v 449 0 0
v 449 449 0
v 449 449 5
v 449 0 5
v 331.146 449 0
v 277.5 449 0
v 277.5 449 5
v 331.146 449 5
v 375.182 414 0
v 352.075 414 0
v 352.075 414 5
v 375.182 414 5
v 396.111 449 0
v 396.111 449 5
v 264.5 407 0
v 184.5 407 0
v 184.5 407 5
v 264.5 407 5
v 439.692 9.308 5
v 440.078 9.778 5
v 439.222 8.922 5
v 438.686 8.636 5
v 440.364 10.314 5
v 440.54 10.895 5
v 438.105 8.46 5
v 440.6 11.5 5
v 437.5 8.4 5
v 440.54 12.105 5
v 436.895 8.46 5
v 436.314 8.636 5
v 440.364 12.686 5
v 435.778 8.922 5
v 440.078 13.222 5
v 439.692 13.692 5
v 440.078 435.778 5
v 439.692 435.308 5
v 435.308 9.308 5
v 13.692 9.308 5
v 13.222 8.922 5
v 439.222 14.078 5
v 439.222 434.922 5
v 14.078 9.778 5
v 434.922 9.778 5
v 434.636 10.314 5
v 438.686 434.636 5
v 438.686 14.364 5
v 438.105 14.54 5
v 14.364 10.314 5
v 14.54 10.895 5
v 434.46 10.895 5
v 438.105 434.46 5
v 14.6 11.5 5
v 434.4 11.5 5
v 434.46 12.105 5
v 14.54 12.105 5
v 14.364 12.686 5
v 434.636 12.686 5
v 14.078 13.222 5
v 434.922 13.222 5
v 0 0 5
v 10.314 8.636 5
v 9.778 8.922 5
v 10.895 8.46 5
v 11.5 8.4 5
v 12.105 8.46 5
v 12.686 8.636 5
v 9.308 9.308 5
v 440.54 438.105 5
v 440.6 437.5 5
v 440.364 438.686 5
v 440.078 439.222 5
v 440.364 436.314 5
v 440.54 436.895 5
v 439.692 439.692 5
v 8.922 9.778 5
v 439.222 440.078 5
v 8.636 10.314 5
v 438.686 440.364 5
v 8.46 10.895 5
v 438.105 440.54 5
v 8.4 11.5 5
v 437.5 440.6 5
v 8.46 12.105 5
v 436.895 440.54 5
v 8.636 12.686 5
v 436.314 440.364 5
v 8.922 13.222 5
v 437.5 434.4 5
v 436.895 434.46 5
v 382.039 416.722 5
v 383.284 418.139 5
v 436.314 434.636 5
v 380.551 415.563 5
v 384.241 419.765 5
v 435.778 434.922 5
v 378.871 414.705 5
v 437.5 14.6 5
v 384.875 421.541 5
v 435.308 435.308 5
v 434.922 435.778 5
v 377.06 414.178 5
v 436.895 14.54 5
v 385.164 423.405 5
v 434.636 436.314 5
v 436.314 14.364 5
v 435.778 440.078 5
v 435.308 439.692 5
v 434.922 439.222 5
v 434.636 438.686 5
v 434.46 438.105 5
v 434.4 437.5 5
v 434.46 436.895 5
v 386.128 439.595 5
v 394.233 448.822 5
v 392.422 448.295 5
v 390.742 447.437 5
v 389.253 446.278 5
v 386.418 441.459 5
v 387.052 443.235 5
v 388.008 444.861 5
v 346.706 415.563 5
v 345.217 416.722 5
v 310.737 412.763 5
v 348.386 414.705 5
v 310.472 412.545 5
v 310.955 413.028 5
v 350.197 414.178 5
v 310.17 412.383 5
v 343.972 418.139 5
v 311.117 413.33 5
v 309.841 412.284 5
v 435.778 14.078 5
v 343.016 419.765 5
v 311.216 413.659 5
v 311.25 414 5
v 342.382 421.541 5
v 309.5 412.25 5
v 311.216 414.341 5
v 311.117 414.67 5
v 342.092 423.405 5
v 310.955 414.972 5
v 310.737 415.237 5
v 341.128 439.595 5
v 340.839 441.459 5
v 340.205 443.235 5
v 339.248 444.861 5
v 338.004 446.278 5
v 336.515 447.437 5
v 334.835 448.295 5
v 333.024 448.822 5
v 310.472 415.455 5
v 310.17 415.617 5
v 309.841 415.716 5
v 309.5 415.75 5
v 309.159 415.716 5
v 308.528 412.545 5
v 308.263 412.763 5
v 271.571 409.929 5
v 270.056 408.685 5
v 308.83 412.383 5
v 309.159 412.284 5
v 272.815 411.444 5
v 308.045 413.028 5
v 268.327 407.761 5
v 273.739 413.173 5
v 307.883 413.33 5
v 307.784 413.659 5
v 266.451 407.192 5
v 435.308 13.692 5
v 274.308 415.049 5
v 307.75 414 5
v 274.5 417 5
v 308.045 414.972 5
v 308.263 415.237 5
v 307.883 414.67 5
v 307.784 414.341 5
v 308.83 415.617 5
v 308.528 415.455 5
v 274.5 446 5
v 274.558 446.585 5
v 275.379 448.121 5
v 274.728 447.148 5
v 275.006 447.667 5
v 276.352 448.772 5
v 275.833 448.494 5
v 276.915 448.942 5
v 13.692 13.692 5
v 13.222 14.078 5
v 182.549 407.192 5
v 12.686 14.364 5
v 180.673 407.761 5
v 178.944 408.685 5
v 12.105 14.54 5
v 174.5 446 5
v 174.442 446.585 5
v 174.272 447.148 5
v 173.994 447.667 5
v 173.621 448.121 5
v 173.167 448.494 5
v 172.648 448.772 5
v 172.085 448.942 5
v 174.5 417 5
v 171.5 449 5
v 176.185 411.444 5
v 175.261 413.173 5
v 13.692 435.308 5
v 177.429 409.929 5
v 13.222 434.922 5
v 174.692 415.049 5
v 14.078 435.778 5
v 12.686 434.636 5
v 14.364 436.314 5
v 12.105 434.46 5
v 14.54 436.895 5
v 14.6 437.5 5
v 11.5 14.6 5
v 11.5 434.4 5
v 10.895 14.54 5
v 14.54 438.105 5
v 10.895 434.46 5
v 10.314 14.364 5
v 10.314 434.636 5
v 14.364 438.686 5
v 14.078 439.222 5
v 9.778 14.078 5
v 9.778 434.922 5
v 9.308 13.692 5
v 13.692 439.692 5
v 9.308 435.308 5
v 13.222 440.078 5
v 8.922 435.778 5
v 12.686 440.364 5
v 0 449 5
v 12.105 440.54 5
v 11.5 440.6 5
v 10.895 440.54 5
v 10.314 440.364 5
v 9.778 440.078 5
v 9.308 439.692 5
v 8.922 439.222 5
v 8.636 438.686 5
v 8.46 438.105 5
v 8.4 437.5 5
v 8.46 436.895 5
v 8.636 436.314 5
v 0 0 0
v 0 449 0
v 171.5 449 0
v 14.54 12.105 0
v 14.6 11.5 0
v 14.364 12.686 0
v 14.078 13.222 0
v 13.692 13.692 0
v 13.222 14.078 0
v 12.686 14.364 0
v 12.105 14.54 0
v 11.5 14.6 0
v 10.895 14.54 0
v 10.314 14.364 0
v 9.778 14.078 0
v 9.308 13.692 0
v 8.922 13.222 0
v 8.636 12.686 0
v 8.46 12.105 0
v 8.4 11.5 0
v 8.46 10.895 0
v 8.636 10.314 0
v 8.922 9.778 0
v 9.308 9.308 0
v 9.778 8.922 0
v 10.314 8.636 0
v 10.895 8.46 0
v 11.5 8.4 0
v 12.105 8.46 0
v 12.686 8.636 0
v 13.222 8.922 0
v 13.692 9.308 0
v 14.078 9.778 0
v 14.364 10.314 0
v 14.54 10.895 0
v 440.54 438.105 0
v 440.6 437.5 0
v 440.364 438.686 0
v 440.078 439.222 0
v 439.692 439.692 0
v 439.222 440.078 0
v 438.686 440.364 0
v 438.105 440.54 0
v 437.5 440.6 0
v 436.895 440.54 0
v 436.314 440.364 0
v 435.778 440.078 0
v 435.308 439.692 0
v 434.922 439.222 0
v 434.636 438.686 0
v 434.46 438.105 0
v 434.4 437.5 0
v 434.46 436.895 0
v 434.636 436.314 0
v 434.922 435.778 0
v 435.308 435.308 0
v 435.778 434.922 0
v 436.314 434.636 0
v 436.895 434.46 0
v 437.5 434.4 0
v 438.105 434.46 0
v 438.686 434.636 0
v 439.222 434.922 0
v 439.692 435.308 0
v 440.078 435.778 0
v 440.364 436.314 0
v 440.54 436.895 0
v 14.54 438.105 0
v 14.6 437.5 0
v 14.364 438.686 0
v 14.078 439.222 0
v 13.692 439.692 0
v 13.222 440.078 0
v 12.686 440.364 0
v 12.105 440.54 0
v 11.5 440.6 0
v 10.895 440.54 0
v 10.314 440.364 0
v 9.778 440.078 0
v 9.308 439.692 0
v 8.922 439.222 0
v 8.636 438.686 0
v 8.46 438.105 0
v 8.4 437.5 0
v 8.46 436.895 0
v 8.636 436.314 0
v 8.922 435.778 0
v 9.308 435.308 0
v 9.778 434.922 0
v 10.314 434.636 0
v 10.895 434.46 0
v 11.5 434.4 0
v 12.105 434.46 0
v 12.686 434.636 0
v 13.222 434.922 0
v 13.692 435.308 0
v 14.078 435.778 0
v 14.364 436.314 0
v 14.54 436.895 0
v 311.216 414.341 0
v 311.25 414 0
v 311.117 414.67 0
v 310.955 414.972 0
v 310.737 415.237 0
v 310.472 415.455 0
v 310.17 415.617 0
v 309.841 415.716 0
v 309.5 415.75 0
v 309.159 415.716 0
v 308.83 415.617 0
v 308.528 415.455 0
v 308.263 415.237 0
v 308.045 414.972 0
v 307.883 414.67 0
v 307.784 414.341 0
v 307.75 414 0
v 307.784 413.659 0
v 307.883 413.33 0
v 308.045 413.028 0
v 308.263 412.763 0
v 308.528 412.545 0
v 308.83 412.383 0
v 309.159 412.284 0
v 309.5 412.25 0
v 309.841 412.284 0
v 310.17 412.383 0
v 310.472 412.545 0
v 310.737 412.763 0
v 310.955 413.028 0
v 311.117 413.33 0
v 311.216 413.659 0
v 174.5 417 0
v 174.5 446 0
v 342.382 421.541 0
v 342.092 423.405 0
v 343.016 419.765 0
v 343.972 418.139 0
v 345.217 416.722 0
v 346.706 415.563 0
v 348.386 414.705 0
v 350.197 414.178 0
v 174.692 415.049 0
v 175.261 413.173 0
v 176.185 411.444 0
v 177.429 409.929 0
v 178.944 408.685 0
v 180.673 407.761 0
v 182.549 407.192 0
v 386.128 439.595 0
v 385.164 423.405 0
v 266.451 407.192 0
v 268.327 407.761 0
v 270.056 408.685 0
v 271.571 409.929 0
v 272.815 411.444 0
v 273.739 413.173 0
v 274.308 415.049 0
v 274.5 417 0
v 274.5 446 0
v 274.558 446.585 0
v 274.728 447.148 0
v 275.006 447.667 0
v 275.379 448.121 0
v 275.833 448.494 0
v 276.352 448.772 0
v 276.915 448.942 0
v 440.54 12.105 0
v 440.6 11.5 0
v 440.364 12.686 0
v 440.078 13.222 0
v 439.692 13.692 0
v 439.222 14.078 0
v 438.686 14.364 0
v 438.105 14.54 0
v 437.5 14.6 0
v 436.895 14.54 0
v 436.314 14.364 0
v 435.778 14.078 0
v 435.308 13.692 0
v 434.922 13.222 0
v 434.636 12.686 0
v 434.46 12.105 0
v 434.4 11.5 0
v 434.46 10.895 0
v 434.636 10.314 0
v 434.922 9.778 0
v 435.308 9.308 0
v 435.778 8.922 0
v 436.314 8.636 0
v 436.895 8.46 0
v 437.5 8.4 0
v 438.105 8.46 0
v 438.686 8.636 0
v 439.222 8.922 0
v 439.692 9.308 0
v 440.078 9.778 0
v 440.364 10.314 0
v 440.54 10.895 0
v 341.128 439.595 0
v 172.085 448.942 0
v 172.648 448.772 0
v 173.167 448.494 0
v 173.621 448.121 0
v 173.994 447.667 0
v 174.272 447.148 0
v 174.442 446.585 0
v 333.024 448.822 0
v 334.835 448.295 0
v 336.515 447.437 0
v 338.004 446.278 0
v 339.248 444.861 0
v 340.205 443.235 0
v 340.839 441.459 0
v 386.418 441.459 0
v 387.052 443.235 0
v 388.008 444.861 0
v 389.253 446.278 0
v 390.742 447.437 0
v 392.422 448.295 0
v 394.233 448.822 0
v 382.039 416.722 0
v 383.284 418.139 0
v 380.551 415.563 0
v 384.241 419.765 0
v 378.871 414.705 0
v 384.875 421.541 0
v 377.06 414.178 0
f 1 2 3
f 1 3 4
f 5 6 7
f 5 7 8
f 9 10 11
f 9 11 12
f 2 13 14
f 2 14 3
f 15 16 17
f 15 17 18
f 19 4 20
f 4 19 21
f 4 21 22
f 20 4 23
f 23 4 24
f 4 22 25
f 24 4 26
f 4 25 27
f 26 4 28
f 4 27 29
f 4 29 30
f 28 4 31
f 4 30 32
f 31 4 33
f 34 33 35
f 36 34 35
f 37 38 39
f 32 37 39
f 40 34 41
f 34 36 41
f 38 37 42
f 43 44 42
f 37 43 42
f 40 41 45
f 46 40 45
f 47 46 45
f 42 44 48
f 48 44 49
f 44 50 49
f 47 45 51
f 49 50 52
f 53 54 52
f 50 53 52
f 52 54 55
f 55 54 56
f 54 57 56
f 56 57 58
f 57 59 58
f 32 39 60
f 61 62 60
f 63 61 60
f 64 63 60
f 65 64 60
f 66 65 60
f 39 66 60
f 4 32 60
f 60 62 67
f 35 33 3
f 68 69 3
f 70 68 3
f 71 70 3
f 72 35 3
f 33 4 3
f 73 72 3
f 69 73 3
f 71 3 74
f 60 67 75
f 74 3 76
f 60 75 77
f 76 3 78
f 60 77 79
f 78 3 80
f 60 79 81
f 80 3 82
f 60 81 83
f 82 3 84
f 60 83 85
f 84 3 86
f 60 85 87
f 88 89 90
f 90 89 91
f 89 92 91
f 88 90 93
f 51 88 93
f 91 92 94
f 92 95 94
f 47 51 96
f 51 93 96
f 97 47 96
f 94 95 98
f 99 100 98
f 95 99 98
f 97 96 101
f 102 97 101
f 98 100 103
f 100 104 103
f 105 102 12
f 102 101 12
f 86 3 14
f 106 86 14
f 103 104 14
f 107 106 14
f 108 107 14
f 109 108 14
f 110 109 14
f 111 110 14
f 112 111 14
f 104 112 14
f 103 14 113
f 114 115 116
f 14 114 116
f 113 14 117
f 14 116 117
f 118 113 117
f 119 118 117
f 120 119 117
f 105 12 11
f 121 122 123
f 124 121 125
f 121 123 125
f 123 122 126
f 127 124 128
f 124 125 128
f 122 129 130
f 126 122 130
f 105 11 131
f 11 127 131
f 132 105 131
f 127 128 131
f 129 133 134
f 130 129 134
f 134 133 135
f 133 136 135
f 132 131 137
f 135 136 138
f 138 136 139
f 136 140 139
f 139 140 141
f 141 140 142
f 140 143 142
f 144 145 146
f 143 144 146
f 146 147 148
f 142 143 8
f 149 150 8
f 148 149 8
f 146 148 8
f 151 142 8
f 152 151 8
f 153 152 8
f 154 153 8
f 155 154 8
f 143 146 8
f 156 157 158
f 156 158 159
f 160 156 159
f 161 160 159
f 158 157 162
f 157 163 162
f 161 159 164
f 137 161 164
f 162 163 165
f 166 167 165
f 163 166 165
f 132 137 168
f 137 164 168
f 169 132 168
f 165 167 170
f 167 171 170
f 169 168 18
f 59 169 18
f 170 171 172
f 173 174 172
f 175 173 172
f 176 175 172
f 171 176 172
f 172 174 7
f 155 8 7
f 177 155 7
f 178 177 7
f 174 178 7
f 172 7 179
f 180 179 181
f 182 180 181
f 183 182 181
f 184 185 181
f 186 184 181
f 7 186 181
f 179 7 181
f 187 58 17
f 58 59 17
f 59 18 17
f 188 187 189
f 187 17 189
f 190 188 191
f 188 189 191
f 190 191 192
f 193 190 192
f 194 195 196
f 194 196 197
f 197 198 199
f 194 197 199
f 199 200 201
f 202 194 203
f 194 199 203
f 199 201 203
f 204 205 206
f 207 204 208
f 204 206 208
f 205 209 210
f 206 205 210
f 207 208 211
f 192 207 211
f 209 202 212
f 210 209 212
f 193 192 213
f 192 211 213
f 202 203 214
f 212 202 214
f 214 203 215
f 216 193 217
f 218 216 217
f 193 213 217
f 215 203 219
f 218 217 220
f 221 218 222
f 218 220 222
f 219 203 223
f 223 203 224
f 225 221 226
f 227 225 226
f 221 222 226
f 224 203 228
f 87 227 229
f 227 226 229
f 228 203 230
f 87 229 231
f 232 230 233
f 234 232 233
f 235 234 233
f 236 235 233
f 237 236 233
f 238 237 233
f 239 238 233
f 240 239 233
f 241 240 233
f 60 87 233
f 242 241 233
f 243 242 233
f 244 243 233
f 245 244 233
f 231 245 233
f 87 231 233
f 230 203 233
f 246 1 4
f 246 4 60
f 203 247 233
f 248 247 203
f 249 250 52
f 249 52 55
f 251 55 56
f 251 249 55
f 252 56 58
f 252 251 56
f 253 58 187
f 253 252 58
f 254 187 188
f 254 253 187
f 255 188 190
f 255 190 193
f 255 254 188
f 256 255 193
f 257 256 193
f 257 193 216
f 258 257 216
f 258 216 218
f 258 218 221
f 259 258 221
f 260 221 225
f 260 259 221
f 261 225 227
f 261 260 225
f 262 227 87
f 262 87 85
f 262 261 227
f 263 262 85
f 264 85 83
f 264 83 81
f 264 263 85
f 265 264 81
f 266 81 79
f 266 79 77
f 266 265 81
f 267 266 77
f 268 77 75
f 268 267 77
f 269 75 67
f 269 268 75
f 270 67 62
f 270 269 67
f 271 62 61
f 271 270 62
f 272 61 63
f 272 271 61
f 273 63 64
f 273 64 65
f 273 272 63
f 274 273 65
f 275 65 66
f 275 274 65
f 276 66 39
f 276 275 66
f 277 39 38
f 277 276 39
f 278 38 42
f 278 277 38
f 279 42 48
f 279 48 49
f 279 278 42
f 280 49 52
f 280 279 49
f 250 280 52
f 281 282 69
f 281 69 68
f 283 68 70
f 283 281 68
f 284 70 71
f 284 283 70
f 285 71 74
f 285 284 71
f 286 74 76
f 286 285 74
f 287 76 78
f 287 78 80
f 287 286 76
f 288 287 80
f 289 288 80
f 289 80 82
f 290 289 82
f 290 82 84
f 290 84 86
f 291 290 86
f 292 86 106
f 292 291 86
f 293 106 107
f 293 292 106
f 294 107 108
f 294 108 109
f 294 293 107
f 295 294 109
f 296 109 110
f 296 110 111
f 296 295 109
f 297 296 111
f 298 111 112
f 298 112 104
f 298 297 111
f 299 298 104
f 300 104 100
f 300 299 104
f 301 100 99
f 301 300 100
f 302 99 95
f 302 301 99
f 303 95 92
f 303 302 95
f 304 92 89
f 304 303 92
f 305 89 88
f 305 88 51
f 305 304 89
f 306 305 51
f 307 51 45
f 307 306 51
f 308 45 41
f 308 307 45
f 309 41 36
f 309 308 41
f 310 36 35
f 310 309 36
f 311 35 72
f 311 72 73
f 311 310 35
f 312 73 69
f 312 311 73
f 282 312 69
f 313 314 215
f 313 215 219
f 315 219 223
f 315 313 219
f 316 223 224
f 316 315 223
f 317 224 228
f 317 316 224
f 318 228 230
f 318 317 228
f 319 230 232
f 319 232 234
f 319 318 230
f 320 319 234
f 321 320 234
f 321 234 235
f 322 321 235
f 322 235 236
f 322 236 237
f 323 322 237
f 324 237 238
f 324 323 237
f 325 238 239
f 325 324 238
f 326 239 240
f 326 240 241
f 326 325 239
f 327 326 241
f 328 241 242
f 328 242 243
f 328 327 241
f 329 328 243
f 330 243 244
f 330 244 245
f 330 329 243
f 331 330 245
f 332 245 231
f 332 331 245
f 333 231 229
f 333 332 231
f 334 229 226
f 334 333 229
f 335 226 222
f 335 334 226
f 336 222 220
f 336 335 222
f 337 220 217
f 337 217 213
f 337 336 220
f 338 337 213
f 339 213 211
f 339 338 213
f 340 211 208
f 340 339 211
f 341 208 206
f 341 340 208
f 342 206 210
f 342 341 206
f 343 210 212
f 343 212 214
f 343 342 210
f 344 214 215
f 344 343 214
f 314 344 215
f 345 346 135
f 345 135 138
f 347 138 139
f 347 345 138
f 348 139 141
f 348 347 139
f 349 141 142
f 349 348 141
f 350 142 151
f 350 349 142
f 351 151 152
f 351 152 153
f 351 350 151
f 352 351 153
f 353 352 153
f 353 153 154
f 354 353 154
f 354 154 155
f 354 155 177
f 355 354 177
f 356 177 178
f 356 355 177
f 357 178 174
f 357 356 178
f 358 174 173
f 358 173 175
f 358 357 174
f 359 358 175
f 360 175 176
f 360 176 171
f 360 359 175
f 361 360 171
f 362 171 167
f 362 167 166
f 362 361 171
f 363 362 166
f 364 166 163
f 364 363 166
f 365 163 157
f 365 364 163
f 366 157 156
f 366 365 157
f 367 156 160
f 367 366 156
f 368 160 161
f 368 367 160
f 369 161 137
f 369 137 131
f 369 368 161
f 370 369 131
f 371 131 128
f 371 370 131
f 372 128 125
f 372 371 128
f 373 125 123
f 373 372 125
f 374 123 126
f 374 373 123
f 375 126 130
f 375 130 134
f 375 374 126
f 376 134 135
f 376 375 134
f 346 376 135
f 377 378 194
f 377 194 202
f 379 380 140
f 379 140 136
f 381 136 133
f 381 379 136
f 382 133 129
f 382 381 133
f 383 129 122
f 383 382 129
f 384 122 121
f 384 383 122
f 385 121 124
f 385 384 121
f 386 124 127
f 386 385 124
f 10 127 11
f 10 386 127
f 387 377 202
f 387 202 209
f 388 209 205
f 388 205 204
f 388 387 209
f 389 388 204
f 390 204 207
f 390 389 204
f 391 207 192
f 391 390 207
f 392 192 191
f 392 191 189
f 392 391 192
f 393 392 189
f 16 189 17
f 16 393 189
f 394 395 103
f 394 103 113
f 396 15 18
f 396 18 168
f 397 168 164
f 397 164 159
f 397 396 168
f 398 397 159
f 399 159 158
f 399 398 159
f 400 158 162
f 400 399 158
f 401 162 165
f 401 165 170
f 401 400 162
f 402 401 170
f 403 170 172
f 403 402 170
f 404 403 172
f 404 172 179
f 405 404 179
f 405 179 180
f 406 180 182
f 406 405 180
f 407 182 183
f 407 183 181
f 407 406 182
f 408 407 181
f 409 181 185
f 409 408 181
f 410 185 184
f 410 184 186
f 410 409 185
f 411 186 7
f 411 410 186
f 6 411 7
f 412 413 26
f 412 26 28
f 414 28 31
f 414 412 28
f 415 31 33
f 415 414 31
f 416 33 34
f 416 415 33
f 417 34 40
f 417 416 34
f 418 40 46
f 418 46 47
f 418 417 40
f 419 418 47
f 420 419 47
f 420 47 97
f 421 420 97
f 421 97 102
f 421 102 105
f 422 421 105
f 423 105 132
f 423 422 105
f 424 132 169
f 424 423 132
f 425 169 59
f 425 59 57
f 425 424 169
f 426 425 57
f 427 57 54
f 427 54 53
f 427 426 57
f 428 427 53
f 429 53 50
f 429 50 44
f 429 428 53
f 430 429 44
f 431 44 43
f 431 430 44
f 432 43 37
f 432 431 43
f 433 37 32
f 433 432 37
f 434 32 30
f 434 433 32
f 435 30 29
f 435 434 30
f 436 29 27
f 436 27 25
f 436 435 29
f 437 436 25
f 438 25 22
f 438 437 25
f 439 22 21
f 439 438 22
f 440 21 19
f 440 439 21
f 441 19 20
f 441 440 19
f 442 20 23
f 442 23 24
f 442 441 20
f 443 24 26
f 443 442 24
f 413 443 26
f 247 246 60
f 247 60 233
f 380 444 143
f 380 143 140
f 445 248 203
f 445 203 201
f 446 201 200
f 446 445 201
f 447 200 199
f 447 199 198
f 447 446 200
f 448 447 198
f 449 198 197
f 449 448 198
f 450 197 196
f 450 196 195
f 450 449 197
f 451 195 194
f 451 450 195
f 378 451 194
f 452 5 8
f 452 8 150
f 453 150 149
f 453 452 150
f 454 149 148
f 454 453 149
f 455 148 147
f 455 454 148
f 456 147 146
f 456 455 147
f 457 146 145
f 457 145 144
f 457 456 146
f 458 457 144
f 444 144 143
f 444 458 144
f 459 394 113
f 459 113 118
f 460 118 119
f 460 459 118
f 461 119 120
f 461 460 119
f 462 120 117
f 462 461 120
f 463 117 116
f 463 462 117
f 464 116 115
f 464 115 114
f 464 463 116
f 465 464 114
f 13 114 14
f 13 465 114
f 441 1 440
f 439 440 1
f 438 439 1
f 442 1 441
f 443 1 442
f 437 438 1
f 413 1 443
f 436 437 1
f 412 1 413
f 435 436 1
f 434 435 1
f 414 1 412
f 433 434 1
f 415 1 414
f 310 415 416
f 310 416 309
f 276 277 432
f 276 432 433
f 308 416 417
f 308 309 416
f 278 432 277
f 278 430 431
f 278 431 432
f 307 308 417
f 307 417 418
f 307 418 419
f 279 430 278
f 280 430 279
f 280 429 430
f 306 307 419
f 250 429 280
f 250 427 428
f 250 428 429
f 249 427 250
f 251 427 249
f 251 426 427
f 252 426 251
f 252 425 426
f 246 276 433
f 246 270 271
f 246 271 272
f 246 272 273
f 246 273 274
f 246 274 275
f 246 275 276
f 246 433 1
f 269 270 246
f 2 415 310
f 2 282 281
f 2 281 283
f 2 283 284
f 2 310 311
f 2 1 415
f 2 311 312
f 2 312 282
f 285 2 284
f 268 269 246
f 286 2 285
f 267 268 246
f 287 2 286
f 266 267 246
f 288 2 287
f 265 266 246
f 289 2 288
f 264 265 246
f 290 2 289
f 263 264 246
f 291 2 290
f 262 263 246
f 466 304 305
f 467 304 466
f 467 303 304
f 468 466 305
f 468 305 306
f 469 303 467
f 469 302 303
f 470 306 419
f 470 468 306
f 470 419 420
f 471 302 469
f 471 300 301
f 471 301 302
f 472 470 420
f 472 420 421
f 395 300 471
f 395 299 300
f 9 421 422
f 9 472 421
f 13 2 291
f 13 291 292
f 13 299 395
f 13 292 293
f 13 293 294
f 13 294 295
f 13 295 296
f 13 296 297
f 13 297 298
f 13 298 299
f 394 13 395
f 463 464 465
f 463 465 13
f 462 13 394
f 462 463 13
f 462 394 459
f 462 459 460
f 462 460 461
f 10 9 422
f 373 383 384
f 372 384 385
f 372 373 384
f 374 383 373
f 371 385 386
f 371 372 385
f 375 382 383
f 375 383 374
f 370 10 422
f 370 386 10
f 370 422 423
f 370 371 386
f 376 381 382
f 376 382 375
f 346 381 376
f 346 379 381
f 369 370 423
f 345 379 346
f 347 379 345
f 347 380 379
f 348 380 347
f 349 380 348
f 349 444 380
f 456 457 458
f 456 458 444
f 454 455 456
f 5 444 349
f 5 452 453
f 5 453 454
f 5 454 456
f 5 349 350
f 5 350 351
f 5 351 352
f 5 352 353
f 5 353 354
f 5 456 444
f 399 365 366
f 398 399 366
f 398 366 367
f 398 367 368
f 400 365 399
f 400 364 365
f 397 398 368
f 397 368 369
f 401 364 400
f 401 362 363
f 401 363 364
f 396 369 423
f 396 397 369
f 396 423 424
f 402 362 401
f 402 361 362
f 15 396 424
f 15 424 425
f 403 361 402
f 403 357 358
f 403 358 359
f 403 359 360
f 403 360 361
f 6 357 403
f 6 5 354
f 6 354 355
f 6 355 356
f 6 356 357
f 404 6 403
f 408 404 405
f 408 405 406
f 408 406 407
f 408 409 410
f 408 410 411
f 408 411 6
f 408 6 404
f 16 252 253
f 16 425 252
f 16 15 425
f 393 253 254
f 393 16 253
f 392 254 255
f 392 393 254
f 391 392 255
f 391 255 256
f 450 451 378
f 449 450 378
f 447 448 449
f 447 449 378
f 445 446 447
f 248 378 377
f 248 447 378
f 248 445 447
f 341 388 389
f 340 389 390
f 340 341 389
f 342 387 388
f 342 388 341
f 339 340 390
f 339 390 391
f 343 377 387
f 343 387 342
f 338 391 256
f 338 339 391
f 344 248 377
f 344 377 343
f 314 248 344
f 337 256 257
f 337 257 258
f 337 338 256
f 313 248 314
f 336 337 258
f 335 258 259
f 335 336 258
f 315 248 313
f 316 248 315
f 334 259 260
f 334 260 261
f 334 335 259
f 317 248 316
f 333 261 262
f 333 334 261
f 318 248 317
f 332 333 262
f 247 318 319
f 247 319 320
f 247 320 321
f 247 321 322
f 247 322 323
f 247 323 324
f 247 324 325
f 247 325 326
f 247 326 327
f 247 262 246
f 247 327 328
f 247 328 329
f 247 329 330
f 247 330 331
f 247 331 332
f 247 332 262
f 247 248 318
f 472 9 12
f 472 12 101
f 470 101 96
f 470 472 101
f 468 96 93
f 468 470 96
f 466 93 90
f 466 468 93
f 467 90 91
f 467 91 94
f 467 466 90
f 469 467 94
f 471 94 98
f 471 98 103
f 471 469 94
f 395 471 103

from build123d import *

# Parameters (mm, degrees)
SCHIZZO1_R                   = 3.1
SCHIZZO1_R_2                 = 1.75
ESTRUSIONE_ESTRUSIONE1_DEPTH = 5


with BuildPart() as part:
    # Schizzo1 → Estrusione-Estrusione1 (new body)
    with BuildSketch(Plane.XY):
        with BuildLine():
            Line((0, 0), (0, 449))
            Line((0, 449), (171.5, 449))
            ThreePointArc((171.5, 449), (173.621320344, 448.121320344), (174.5, 446))
            Line((174.5, 446), (174.5, 417))
            ThreePointArc((174.5, 417), (177.428932188, 409.928932188), (184.5, 407))
            Line((184.5, 407), (264.5, 407))
            ThreePointArc((264.5, 407), (271.571067812, 409.928932188), (274.5, 417))
            Line((274.5, 417), (274.5, 446))
            ThreePointArc((274.5, 446), (275.378679656, 448.121320344), (277.5, 449))
            Line((277.5, 449), (331.145963874, 449))
            ThreePointArc((331.145963874, 449), (338.003609857, 446.278234097), (341.128274438, 439.594538314))
            Line((341.128274438, 439.594538314), (342.092482701, 423.405461686))
            ThreePointArc((342.092482701, 423.405461686), (345.217147282, 416.721765903), (352.074793265, 414))
            Line((352.074793265, 414), (375.181755612, 414))
            ThreePointArc((375.181755612, 414), (382.039401595, 416.721765903), (385.164066175, 423.405461686))
            Line((385.164066175, 423.405461686), (386.128274438, 439.594538314))
            ThreePointArc((386.128274438, 439.594538314), (389.252939019, 446.278234097), (396.110585002, 449))
            Line((396.110585002, 449), (449, 449))
            Line((449, 449), (449, 0))
            Line((449, 0), (0, 0))
        make_face()
        with Locations((11.5, 11.5)):
            Circle(SCHIZZO1_R, mode=Mode.SUBTRACT)
        with Locations((437.5, 11.5)):
            Circle(SCHIZZO1_R, mode=Mode.SUBTRACT)
        with Locations((437.5, 437.5)):
            Circle(SCHIZZO1_R, mode=Mode.SUBTRACT)
        with Locations((11.5, 437.5)):
            Circle(SCHIZZO1_R, mode=Mode.SUBTRACT)
        with Locations((309.5, 414)):
            Circle(SCHIZZO1_R_2, mode=Mode.SUBTRACT)
    extrude(amount=ESTRUSIONE_ESTRUSIONE1_DEPTH)


solid = part.part
